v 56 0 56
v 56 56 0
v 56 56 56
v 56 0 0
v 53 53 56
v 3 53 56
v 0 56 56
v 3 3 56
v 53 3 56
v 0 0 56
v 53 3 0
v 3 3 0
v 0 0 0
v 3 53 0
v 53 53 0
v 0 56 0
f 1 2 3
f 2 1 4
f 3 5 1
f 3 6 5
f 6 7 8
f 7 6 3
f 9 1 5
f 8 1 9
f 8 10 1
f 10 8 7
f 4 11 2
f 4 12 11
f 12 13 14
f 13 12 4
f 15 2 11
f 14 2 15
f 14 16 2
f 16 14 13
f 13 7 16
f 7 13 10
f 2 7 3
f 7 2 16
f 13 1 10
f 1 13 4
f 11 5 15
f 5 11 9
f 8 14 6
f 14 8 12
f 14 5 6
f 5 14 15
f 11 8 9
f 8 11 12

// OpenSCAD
wallthickness = 3;

sizex = 50 + (wallthickness*2);
sizey = 50 + (wallthickness*2);
sizez = 50 + (wallthickness*2);

difference() {
    cube([
        sizex,
        sizey,
        sizez
    ]);
    translate([wallthickness,wallthickness,-1]) {
        cube([
            sizex-(wallthickness*2),
            sizey-(wallthickness*2),
            sizez+5
        ]);
    }
}
